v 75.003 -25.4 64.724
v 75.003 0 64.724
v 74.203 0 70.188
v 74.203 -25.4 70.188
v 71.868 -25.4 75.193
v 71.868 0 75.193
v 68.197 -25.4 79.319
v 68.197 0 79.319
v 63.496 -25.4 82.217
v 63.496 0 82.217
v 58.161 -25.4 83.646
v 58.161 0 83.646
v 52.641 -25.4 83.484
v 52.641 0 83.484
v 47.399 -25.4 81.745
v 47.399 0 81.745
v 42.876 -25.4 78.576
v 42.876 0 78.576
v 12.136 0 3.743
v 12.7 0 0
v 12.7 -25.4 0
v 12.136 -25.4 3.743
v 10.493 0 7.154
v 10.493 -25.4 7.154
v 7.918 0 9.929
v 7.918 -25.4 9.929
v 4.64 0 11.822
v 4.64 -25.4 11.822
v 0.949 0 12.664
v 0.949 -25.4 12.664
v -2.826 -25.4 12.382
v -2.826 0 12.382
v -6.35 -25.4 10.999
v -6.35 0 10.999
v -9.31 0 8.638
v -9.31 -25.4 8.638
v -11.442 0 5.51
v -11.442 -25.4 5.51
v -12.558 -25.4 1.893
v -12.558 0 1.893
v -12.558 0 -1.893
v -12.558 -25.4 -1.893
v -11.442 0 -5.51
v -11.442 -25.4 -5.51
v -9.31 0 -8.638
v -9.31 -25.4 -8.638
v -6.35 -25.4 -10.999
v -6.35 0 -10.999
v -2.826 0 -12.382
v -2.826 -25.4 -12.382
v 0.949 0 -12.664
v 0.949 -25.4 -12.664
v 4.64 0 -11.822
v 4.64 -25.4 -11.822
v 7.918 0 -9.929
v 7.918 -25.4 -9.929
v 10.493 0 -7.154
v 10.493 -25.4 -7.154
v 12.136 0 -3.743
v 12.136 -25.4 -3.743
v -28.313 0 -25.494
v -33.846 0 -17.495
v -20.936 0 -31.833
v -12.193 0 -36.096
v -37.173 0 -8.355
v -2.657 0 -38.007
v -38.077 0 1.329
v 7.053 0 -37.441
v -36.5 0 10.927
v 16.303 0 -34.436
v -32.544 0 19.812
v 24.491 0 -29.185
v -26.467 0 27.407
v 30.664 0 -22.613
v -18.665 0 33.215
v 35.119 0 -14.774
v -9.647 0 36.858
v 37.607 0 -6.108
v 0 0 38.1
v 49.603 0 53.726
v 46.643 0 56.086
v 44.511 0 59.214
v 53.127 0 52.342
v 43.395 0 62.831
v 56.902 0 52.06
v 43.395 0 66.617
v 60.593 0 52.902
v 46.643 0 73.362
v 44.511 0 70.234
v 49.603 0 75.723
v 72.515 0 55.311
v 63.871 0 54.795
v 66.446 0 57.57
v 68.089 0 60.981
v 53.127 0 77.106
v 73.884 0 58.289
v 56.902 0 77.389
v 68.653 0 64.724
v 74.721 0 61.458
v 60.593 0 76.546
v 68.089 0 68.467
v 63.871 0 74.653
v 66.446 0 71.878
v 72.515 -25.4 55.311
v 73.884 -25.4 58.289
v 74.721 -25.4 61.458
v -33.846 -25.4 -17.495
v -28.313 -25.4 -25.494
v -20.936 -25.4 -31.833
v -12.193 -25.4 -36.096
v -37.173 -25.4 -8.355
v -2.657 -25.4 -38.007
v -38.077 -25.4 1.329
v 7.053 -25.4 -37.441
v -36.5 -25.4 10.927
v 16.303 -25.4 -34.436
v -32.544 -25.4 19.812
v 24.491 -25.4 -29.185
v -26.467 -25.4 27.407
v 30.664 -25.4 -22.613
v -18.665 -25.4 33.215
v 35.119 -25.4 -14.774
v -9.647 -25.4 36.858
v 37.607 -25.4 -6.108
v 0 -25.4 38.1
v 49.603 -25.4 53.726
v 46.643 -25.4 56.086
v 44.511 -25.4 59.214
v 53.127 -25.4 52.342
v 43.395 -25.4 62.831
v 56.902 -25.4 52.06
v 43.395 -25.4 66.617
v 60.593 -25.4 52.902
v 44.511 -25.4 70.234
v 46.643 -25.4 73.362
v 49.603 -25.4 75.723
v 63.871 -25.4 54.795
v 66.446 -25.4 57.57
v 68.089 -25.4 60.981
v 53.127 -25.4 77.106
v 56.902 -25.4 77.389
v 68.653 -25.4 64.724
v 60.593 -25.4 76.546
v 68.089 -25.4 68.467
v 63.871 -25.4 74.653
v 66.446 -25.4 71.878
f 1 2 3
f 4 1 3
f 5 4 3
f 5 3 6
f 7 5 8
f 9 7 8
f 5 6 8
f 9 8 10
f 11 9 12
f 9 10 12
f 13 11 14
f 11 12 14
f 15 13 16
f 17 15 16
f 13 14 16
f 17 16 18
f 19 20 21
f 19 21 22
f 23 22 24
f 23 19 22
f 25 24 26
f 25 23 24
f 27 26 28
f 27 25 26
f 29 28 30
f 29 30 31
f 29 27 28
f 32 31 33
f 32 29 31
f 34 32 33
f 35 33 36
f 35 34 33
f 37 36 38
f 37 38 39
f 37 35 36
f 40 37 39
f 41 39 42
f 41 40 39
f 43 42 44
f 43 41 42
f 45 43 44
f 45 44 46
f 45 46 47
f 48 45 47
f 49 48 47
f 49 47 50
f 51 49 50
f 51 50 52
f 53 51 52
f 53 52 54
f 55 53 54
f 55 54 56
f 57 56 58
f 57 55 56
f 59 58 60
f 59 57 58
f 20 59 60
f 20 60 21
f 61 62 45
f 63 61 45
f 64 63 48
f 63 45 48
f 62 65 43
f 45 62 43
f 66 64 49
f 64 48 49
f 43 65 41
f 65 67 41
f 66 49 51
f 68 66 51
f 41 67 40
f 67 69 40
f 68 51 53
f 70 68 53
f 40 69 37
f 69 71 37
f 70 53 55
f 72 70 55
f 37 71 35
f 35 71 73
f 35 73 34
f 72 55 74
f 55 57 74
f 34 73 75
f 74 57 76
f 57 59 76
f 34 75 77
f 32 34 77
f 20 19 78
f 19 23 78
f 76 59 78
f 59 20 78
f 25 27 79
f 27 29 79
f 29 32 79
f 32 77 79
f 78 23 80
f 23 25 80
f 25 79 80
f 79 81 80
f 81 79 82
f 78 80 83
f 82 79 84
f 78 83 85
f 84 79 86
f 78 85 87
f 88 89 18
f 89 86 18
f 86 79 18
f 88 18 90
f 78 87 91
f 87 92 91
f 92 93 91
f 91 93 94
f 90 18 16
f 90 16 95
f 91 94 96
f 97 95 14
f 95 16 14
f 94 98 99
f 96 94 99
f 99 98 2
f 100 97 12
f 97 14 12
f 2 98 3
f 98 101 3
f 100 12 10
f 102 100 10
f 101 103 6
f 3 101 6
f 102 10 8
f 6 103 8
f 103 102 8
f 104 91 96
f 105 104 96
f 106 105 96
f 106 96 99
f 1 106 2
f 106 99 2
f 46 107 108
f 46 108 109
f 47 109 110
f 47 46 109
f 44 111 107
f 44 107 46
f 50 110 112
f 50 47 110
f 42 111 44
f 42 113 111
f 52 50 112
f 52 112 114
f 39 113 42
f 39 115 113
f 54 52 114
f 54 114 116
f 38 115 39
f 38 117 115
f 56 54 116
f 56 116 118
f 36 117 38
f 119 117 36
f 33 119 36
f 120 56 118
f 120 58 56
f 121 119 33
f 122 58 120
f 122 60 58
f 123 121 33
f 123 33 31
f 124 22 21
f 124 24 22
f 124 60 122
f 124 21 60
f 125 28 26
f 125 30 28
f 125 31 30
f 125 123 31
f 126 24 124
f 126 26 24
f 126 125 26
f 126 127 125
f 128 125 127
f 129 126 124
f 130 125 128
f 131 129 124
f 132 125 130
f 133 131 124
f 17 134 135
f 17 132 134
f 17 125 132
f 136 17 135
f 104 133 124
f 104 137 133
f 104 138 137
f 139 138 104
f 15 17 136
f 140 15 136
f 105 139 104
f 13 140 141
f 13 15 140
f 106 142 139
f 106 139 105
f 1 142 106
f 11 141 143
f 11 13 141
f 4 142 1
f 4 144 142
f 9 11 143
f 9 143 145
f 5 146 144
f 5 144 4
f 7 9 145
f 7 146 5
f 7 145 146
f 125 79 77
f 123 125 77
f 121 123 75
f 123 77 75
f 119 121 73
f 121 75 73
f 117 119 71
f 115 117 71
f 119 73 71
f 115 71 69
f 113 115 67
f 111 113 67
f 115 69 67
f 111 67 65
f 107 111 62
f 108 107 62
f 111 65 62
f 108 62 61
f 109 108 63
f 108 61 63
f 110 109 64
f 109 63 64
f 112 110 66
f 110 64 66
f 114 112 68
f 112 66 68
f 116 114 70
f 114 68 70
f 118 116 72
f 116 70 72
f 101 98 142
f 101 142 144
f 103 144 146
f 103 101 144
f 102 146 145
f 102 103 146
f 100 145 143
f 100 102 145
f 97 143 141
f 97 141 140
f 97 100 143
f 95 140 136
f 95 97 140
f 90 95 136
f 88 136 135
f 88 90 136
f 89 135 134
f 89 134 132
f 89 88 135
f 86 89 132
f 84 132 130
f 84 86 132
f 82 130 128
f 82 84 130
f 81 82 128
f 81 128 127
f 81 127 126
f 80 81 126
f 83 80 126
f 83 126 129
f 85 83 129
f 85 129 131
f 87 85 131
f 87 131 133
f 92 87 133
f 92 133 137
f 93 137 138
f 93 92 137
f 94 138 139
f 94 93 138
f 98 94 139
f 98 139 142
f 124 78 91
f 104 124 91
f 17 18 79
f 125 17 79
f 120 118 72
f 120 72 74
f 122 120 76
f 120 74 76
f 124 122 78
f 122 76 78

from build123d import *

# Parameters (mm, degrees)
F0_R     = 12.7
F1_DEPTH = 25.4


with BuildPart() as f1:
    # F0 (on Front) → F1 (new body)
    with BuildSketch(Plane.XZ):
        with BuildLine():
            ThreePointArc((37.607153, -6.108355), (37.976588, -3.064103), (38.1, 0))
            ThreePointArc((38.1, 0), (26.940768, 26.940768), (0, 38.1))
            ThreePointArc((0, 38.1), (-35.802072, -13.031564), (24.49118, -29.185477))
            Line((24.49118, -29.185477), (37.607153, -6.108355))
        make_face()
        Circle(F0_R, mode=Mode.SUBTRACT)
        with BuildLine():
            ThreePointArc((0, 38.1), (26.940768, 26.940768), (38.1, 0))
            ThreePointArc((38.1, 0), (37.976588, -3.064103), (37.607153, -6.108355))
            Line((37.607153, -6.108355), (72.515102, 55.311028))
            ThreePointArc((72.515102, 55.311028), (65.534173, 48.258733), (55.953582, 45.674062))
            Line((55.953582, 45.674062), (55.952777, 45.674062))
            ThreePointArc((55.952777, 45.674062), (38.250123, 57.688134), (42.875991, 78.576486))
            Line((42.875991, 78.576486), (0, 38.1))
        make_face()
        with BuildLine():
            ThreePointArc((24.49118, -29.185477), (33.123846, -18.826068), (37.607153, -6.108355))
            Line((37.607153, -6.108355), (24.49118, -29.185477))
        make_face()
        with BuildLine():
            ThreePointArc((75.003179, 64.724062), (63.495793, 82.217246), (42.875991, 78.576486))
            ThreePointArc((42.875991, 78.576486), (38.250123, 57.688134), (55.952777, 45.674062))
            Line((55.952777, 45.674062), (55.953582, 45.674062))
            ThreePointArc((55.953582, 45.674062), (65.534173, 48.258733), (72.515102, 55.311028))
            ThreePointArc((72.515102, 55.311028), (74.370659, 59.855907), (75.003179, 64.724062))
        make_face()
        with Locations((55.953179, 64.724062)):
            Circle(F0_R, mode=Mode.SUBTRACT)
    extrude(amount=F1_DEPTH)


solid = f1.part
